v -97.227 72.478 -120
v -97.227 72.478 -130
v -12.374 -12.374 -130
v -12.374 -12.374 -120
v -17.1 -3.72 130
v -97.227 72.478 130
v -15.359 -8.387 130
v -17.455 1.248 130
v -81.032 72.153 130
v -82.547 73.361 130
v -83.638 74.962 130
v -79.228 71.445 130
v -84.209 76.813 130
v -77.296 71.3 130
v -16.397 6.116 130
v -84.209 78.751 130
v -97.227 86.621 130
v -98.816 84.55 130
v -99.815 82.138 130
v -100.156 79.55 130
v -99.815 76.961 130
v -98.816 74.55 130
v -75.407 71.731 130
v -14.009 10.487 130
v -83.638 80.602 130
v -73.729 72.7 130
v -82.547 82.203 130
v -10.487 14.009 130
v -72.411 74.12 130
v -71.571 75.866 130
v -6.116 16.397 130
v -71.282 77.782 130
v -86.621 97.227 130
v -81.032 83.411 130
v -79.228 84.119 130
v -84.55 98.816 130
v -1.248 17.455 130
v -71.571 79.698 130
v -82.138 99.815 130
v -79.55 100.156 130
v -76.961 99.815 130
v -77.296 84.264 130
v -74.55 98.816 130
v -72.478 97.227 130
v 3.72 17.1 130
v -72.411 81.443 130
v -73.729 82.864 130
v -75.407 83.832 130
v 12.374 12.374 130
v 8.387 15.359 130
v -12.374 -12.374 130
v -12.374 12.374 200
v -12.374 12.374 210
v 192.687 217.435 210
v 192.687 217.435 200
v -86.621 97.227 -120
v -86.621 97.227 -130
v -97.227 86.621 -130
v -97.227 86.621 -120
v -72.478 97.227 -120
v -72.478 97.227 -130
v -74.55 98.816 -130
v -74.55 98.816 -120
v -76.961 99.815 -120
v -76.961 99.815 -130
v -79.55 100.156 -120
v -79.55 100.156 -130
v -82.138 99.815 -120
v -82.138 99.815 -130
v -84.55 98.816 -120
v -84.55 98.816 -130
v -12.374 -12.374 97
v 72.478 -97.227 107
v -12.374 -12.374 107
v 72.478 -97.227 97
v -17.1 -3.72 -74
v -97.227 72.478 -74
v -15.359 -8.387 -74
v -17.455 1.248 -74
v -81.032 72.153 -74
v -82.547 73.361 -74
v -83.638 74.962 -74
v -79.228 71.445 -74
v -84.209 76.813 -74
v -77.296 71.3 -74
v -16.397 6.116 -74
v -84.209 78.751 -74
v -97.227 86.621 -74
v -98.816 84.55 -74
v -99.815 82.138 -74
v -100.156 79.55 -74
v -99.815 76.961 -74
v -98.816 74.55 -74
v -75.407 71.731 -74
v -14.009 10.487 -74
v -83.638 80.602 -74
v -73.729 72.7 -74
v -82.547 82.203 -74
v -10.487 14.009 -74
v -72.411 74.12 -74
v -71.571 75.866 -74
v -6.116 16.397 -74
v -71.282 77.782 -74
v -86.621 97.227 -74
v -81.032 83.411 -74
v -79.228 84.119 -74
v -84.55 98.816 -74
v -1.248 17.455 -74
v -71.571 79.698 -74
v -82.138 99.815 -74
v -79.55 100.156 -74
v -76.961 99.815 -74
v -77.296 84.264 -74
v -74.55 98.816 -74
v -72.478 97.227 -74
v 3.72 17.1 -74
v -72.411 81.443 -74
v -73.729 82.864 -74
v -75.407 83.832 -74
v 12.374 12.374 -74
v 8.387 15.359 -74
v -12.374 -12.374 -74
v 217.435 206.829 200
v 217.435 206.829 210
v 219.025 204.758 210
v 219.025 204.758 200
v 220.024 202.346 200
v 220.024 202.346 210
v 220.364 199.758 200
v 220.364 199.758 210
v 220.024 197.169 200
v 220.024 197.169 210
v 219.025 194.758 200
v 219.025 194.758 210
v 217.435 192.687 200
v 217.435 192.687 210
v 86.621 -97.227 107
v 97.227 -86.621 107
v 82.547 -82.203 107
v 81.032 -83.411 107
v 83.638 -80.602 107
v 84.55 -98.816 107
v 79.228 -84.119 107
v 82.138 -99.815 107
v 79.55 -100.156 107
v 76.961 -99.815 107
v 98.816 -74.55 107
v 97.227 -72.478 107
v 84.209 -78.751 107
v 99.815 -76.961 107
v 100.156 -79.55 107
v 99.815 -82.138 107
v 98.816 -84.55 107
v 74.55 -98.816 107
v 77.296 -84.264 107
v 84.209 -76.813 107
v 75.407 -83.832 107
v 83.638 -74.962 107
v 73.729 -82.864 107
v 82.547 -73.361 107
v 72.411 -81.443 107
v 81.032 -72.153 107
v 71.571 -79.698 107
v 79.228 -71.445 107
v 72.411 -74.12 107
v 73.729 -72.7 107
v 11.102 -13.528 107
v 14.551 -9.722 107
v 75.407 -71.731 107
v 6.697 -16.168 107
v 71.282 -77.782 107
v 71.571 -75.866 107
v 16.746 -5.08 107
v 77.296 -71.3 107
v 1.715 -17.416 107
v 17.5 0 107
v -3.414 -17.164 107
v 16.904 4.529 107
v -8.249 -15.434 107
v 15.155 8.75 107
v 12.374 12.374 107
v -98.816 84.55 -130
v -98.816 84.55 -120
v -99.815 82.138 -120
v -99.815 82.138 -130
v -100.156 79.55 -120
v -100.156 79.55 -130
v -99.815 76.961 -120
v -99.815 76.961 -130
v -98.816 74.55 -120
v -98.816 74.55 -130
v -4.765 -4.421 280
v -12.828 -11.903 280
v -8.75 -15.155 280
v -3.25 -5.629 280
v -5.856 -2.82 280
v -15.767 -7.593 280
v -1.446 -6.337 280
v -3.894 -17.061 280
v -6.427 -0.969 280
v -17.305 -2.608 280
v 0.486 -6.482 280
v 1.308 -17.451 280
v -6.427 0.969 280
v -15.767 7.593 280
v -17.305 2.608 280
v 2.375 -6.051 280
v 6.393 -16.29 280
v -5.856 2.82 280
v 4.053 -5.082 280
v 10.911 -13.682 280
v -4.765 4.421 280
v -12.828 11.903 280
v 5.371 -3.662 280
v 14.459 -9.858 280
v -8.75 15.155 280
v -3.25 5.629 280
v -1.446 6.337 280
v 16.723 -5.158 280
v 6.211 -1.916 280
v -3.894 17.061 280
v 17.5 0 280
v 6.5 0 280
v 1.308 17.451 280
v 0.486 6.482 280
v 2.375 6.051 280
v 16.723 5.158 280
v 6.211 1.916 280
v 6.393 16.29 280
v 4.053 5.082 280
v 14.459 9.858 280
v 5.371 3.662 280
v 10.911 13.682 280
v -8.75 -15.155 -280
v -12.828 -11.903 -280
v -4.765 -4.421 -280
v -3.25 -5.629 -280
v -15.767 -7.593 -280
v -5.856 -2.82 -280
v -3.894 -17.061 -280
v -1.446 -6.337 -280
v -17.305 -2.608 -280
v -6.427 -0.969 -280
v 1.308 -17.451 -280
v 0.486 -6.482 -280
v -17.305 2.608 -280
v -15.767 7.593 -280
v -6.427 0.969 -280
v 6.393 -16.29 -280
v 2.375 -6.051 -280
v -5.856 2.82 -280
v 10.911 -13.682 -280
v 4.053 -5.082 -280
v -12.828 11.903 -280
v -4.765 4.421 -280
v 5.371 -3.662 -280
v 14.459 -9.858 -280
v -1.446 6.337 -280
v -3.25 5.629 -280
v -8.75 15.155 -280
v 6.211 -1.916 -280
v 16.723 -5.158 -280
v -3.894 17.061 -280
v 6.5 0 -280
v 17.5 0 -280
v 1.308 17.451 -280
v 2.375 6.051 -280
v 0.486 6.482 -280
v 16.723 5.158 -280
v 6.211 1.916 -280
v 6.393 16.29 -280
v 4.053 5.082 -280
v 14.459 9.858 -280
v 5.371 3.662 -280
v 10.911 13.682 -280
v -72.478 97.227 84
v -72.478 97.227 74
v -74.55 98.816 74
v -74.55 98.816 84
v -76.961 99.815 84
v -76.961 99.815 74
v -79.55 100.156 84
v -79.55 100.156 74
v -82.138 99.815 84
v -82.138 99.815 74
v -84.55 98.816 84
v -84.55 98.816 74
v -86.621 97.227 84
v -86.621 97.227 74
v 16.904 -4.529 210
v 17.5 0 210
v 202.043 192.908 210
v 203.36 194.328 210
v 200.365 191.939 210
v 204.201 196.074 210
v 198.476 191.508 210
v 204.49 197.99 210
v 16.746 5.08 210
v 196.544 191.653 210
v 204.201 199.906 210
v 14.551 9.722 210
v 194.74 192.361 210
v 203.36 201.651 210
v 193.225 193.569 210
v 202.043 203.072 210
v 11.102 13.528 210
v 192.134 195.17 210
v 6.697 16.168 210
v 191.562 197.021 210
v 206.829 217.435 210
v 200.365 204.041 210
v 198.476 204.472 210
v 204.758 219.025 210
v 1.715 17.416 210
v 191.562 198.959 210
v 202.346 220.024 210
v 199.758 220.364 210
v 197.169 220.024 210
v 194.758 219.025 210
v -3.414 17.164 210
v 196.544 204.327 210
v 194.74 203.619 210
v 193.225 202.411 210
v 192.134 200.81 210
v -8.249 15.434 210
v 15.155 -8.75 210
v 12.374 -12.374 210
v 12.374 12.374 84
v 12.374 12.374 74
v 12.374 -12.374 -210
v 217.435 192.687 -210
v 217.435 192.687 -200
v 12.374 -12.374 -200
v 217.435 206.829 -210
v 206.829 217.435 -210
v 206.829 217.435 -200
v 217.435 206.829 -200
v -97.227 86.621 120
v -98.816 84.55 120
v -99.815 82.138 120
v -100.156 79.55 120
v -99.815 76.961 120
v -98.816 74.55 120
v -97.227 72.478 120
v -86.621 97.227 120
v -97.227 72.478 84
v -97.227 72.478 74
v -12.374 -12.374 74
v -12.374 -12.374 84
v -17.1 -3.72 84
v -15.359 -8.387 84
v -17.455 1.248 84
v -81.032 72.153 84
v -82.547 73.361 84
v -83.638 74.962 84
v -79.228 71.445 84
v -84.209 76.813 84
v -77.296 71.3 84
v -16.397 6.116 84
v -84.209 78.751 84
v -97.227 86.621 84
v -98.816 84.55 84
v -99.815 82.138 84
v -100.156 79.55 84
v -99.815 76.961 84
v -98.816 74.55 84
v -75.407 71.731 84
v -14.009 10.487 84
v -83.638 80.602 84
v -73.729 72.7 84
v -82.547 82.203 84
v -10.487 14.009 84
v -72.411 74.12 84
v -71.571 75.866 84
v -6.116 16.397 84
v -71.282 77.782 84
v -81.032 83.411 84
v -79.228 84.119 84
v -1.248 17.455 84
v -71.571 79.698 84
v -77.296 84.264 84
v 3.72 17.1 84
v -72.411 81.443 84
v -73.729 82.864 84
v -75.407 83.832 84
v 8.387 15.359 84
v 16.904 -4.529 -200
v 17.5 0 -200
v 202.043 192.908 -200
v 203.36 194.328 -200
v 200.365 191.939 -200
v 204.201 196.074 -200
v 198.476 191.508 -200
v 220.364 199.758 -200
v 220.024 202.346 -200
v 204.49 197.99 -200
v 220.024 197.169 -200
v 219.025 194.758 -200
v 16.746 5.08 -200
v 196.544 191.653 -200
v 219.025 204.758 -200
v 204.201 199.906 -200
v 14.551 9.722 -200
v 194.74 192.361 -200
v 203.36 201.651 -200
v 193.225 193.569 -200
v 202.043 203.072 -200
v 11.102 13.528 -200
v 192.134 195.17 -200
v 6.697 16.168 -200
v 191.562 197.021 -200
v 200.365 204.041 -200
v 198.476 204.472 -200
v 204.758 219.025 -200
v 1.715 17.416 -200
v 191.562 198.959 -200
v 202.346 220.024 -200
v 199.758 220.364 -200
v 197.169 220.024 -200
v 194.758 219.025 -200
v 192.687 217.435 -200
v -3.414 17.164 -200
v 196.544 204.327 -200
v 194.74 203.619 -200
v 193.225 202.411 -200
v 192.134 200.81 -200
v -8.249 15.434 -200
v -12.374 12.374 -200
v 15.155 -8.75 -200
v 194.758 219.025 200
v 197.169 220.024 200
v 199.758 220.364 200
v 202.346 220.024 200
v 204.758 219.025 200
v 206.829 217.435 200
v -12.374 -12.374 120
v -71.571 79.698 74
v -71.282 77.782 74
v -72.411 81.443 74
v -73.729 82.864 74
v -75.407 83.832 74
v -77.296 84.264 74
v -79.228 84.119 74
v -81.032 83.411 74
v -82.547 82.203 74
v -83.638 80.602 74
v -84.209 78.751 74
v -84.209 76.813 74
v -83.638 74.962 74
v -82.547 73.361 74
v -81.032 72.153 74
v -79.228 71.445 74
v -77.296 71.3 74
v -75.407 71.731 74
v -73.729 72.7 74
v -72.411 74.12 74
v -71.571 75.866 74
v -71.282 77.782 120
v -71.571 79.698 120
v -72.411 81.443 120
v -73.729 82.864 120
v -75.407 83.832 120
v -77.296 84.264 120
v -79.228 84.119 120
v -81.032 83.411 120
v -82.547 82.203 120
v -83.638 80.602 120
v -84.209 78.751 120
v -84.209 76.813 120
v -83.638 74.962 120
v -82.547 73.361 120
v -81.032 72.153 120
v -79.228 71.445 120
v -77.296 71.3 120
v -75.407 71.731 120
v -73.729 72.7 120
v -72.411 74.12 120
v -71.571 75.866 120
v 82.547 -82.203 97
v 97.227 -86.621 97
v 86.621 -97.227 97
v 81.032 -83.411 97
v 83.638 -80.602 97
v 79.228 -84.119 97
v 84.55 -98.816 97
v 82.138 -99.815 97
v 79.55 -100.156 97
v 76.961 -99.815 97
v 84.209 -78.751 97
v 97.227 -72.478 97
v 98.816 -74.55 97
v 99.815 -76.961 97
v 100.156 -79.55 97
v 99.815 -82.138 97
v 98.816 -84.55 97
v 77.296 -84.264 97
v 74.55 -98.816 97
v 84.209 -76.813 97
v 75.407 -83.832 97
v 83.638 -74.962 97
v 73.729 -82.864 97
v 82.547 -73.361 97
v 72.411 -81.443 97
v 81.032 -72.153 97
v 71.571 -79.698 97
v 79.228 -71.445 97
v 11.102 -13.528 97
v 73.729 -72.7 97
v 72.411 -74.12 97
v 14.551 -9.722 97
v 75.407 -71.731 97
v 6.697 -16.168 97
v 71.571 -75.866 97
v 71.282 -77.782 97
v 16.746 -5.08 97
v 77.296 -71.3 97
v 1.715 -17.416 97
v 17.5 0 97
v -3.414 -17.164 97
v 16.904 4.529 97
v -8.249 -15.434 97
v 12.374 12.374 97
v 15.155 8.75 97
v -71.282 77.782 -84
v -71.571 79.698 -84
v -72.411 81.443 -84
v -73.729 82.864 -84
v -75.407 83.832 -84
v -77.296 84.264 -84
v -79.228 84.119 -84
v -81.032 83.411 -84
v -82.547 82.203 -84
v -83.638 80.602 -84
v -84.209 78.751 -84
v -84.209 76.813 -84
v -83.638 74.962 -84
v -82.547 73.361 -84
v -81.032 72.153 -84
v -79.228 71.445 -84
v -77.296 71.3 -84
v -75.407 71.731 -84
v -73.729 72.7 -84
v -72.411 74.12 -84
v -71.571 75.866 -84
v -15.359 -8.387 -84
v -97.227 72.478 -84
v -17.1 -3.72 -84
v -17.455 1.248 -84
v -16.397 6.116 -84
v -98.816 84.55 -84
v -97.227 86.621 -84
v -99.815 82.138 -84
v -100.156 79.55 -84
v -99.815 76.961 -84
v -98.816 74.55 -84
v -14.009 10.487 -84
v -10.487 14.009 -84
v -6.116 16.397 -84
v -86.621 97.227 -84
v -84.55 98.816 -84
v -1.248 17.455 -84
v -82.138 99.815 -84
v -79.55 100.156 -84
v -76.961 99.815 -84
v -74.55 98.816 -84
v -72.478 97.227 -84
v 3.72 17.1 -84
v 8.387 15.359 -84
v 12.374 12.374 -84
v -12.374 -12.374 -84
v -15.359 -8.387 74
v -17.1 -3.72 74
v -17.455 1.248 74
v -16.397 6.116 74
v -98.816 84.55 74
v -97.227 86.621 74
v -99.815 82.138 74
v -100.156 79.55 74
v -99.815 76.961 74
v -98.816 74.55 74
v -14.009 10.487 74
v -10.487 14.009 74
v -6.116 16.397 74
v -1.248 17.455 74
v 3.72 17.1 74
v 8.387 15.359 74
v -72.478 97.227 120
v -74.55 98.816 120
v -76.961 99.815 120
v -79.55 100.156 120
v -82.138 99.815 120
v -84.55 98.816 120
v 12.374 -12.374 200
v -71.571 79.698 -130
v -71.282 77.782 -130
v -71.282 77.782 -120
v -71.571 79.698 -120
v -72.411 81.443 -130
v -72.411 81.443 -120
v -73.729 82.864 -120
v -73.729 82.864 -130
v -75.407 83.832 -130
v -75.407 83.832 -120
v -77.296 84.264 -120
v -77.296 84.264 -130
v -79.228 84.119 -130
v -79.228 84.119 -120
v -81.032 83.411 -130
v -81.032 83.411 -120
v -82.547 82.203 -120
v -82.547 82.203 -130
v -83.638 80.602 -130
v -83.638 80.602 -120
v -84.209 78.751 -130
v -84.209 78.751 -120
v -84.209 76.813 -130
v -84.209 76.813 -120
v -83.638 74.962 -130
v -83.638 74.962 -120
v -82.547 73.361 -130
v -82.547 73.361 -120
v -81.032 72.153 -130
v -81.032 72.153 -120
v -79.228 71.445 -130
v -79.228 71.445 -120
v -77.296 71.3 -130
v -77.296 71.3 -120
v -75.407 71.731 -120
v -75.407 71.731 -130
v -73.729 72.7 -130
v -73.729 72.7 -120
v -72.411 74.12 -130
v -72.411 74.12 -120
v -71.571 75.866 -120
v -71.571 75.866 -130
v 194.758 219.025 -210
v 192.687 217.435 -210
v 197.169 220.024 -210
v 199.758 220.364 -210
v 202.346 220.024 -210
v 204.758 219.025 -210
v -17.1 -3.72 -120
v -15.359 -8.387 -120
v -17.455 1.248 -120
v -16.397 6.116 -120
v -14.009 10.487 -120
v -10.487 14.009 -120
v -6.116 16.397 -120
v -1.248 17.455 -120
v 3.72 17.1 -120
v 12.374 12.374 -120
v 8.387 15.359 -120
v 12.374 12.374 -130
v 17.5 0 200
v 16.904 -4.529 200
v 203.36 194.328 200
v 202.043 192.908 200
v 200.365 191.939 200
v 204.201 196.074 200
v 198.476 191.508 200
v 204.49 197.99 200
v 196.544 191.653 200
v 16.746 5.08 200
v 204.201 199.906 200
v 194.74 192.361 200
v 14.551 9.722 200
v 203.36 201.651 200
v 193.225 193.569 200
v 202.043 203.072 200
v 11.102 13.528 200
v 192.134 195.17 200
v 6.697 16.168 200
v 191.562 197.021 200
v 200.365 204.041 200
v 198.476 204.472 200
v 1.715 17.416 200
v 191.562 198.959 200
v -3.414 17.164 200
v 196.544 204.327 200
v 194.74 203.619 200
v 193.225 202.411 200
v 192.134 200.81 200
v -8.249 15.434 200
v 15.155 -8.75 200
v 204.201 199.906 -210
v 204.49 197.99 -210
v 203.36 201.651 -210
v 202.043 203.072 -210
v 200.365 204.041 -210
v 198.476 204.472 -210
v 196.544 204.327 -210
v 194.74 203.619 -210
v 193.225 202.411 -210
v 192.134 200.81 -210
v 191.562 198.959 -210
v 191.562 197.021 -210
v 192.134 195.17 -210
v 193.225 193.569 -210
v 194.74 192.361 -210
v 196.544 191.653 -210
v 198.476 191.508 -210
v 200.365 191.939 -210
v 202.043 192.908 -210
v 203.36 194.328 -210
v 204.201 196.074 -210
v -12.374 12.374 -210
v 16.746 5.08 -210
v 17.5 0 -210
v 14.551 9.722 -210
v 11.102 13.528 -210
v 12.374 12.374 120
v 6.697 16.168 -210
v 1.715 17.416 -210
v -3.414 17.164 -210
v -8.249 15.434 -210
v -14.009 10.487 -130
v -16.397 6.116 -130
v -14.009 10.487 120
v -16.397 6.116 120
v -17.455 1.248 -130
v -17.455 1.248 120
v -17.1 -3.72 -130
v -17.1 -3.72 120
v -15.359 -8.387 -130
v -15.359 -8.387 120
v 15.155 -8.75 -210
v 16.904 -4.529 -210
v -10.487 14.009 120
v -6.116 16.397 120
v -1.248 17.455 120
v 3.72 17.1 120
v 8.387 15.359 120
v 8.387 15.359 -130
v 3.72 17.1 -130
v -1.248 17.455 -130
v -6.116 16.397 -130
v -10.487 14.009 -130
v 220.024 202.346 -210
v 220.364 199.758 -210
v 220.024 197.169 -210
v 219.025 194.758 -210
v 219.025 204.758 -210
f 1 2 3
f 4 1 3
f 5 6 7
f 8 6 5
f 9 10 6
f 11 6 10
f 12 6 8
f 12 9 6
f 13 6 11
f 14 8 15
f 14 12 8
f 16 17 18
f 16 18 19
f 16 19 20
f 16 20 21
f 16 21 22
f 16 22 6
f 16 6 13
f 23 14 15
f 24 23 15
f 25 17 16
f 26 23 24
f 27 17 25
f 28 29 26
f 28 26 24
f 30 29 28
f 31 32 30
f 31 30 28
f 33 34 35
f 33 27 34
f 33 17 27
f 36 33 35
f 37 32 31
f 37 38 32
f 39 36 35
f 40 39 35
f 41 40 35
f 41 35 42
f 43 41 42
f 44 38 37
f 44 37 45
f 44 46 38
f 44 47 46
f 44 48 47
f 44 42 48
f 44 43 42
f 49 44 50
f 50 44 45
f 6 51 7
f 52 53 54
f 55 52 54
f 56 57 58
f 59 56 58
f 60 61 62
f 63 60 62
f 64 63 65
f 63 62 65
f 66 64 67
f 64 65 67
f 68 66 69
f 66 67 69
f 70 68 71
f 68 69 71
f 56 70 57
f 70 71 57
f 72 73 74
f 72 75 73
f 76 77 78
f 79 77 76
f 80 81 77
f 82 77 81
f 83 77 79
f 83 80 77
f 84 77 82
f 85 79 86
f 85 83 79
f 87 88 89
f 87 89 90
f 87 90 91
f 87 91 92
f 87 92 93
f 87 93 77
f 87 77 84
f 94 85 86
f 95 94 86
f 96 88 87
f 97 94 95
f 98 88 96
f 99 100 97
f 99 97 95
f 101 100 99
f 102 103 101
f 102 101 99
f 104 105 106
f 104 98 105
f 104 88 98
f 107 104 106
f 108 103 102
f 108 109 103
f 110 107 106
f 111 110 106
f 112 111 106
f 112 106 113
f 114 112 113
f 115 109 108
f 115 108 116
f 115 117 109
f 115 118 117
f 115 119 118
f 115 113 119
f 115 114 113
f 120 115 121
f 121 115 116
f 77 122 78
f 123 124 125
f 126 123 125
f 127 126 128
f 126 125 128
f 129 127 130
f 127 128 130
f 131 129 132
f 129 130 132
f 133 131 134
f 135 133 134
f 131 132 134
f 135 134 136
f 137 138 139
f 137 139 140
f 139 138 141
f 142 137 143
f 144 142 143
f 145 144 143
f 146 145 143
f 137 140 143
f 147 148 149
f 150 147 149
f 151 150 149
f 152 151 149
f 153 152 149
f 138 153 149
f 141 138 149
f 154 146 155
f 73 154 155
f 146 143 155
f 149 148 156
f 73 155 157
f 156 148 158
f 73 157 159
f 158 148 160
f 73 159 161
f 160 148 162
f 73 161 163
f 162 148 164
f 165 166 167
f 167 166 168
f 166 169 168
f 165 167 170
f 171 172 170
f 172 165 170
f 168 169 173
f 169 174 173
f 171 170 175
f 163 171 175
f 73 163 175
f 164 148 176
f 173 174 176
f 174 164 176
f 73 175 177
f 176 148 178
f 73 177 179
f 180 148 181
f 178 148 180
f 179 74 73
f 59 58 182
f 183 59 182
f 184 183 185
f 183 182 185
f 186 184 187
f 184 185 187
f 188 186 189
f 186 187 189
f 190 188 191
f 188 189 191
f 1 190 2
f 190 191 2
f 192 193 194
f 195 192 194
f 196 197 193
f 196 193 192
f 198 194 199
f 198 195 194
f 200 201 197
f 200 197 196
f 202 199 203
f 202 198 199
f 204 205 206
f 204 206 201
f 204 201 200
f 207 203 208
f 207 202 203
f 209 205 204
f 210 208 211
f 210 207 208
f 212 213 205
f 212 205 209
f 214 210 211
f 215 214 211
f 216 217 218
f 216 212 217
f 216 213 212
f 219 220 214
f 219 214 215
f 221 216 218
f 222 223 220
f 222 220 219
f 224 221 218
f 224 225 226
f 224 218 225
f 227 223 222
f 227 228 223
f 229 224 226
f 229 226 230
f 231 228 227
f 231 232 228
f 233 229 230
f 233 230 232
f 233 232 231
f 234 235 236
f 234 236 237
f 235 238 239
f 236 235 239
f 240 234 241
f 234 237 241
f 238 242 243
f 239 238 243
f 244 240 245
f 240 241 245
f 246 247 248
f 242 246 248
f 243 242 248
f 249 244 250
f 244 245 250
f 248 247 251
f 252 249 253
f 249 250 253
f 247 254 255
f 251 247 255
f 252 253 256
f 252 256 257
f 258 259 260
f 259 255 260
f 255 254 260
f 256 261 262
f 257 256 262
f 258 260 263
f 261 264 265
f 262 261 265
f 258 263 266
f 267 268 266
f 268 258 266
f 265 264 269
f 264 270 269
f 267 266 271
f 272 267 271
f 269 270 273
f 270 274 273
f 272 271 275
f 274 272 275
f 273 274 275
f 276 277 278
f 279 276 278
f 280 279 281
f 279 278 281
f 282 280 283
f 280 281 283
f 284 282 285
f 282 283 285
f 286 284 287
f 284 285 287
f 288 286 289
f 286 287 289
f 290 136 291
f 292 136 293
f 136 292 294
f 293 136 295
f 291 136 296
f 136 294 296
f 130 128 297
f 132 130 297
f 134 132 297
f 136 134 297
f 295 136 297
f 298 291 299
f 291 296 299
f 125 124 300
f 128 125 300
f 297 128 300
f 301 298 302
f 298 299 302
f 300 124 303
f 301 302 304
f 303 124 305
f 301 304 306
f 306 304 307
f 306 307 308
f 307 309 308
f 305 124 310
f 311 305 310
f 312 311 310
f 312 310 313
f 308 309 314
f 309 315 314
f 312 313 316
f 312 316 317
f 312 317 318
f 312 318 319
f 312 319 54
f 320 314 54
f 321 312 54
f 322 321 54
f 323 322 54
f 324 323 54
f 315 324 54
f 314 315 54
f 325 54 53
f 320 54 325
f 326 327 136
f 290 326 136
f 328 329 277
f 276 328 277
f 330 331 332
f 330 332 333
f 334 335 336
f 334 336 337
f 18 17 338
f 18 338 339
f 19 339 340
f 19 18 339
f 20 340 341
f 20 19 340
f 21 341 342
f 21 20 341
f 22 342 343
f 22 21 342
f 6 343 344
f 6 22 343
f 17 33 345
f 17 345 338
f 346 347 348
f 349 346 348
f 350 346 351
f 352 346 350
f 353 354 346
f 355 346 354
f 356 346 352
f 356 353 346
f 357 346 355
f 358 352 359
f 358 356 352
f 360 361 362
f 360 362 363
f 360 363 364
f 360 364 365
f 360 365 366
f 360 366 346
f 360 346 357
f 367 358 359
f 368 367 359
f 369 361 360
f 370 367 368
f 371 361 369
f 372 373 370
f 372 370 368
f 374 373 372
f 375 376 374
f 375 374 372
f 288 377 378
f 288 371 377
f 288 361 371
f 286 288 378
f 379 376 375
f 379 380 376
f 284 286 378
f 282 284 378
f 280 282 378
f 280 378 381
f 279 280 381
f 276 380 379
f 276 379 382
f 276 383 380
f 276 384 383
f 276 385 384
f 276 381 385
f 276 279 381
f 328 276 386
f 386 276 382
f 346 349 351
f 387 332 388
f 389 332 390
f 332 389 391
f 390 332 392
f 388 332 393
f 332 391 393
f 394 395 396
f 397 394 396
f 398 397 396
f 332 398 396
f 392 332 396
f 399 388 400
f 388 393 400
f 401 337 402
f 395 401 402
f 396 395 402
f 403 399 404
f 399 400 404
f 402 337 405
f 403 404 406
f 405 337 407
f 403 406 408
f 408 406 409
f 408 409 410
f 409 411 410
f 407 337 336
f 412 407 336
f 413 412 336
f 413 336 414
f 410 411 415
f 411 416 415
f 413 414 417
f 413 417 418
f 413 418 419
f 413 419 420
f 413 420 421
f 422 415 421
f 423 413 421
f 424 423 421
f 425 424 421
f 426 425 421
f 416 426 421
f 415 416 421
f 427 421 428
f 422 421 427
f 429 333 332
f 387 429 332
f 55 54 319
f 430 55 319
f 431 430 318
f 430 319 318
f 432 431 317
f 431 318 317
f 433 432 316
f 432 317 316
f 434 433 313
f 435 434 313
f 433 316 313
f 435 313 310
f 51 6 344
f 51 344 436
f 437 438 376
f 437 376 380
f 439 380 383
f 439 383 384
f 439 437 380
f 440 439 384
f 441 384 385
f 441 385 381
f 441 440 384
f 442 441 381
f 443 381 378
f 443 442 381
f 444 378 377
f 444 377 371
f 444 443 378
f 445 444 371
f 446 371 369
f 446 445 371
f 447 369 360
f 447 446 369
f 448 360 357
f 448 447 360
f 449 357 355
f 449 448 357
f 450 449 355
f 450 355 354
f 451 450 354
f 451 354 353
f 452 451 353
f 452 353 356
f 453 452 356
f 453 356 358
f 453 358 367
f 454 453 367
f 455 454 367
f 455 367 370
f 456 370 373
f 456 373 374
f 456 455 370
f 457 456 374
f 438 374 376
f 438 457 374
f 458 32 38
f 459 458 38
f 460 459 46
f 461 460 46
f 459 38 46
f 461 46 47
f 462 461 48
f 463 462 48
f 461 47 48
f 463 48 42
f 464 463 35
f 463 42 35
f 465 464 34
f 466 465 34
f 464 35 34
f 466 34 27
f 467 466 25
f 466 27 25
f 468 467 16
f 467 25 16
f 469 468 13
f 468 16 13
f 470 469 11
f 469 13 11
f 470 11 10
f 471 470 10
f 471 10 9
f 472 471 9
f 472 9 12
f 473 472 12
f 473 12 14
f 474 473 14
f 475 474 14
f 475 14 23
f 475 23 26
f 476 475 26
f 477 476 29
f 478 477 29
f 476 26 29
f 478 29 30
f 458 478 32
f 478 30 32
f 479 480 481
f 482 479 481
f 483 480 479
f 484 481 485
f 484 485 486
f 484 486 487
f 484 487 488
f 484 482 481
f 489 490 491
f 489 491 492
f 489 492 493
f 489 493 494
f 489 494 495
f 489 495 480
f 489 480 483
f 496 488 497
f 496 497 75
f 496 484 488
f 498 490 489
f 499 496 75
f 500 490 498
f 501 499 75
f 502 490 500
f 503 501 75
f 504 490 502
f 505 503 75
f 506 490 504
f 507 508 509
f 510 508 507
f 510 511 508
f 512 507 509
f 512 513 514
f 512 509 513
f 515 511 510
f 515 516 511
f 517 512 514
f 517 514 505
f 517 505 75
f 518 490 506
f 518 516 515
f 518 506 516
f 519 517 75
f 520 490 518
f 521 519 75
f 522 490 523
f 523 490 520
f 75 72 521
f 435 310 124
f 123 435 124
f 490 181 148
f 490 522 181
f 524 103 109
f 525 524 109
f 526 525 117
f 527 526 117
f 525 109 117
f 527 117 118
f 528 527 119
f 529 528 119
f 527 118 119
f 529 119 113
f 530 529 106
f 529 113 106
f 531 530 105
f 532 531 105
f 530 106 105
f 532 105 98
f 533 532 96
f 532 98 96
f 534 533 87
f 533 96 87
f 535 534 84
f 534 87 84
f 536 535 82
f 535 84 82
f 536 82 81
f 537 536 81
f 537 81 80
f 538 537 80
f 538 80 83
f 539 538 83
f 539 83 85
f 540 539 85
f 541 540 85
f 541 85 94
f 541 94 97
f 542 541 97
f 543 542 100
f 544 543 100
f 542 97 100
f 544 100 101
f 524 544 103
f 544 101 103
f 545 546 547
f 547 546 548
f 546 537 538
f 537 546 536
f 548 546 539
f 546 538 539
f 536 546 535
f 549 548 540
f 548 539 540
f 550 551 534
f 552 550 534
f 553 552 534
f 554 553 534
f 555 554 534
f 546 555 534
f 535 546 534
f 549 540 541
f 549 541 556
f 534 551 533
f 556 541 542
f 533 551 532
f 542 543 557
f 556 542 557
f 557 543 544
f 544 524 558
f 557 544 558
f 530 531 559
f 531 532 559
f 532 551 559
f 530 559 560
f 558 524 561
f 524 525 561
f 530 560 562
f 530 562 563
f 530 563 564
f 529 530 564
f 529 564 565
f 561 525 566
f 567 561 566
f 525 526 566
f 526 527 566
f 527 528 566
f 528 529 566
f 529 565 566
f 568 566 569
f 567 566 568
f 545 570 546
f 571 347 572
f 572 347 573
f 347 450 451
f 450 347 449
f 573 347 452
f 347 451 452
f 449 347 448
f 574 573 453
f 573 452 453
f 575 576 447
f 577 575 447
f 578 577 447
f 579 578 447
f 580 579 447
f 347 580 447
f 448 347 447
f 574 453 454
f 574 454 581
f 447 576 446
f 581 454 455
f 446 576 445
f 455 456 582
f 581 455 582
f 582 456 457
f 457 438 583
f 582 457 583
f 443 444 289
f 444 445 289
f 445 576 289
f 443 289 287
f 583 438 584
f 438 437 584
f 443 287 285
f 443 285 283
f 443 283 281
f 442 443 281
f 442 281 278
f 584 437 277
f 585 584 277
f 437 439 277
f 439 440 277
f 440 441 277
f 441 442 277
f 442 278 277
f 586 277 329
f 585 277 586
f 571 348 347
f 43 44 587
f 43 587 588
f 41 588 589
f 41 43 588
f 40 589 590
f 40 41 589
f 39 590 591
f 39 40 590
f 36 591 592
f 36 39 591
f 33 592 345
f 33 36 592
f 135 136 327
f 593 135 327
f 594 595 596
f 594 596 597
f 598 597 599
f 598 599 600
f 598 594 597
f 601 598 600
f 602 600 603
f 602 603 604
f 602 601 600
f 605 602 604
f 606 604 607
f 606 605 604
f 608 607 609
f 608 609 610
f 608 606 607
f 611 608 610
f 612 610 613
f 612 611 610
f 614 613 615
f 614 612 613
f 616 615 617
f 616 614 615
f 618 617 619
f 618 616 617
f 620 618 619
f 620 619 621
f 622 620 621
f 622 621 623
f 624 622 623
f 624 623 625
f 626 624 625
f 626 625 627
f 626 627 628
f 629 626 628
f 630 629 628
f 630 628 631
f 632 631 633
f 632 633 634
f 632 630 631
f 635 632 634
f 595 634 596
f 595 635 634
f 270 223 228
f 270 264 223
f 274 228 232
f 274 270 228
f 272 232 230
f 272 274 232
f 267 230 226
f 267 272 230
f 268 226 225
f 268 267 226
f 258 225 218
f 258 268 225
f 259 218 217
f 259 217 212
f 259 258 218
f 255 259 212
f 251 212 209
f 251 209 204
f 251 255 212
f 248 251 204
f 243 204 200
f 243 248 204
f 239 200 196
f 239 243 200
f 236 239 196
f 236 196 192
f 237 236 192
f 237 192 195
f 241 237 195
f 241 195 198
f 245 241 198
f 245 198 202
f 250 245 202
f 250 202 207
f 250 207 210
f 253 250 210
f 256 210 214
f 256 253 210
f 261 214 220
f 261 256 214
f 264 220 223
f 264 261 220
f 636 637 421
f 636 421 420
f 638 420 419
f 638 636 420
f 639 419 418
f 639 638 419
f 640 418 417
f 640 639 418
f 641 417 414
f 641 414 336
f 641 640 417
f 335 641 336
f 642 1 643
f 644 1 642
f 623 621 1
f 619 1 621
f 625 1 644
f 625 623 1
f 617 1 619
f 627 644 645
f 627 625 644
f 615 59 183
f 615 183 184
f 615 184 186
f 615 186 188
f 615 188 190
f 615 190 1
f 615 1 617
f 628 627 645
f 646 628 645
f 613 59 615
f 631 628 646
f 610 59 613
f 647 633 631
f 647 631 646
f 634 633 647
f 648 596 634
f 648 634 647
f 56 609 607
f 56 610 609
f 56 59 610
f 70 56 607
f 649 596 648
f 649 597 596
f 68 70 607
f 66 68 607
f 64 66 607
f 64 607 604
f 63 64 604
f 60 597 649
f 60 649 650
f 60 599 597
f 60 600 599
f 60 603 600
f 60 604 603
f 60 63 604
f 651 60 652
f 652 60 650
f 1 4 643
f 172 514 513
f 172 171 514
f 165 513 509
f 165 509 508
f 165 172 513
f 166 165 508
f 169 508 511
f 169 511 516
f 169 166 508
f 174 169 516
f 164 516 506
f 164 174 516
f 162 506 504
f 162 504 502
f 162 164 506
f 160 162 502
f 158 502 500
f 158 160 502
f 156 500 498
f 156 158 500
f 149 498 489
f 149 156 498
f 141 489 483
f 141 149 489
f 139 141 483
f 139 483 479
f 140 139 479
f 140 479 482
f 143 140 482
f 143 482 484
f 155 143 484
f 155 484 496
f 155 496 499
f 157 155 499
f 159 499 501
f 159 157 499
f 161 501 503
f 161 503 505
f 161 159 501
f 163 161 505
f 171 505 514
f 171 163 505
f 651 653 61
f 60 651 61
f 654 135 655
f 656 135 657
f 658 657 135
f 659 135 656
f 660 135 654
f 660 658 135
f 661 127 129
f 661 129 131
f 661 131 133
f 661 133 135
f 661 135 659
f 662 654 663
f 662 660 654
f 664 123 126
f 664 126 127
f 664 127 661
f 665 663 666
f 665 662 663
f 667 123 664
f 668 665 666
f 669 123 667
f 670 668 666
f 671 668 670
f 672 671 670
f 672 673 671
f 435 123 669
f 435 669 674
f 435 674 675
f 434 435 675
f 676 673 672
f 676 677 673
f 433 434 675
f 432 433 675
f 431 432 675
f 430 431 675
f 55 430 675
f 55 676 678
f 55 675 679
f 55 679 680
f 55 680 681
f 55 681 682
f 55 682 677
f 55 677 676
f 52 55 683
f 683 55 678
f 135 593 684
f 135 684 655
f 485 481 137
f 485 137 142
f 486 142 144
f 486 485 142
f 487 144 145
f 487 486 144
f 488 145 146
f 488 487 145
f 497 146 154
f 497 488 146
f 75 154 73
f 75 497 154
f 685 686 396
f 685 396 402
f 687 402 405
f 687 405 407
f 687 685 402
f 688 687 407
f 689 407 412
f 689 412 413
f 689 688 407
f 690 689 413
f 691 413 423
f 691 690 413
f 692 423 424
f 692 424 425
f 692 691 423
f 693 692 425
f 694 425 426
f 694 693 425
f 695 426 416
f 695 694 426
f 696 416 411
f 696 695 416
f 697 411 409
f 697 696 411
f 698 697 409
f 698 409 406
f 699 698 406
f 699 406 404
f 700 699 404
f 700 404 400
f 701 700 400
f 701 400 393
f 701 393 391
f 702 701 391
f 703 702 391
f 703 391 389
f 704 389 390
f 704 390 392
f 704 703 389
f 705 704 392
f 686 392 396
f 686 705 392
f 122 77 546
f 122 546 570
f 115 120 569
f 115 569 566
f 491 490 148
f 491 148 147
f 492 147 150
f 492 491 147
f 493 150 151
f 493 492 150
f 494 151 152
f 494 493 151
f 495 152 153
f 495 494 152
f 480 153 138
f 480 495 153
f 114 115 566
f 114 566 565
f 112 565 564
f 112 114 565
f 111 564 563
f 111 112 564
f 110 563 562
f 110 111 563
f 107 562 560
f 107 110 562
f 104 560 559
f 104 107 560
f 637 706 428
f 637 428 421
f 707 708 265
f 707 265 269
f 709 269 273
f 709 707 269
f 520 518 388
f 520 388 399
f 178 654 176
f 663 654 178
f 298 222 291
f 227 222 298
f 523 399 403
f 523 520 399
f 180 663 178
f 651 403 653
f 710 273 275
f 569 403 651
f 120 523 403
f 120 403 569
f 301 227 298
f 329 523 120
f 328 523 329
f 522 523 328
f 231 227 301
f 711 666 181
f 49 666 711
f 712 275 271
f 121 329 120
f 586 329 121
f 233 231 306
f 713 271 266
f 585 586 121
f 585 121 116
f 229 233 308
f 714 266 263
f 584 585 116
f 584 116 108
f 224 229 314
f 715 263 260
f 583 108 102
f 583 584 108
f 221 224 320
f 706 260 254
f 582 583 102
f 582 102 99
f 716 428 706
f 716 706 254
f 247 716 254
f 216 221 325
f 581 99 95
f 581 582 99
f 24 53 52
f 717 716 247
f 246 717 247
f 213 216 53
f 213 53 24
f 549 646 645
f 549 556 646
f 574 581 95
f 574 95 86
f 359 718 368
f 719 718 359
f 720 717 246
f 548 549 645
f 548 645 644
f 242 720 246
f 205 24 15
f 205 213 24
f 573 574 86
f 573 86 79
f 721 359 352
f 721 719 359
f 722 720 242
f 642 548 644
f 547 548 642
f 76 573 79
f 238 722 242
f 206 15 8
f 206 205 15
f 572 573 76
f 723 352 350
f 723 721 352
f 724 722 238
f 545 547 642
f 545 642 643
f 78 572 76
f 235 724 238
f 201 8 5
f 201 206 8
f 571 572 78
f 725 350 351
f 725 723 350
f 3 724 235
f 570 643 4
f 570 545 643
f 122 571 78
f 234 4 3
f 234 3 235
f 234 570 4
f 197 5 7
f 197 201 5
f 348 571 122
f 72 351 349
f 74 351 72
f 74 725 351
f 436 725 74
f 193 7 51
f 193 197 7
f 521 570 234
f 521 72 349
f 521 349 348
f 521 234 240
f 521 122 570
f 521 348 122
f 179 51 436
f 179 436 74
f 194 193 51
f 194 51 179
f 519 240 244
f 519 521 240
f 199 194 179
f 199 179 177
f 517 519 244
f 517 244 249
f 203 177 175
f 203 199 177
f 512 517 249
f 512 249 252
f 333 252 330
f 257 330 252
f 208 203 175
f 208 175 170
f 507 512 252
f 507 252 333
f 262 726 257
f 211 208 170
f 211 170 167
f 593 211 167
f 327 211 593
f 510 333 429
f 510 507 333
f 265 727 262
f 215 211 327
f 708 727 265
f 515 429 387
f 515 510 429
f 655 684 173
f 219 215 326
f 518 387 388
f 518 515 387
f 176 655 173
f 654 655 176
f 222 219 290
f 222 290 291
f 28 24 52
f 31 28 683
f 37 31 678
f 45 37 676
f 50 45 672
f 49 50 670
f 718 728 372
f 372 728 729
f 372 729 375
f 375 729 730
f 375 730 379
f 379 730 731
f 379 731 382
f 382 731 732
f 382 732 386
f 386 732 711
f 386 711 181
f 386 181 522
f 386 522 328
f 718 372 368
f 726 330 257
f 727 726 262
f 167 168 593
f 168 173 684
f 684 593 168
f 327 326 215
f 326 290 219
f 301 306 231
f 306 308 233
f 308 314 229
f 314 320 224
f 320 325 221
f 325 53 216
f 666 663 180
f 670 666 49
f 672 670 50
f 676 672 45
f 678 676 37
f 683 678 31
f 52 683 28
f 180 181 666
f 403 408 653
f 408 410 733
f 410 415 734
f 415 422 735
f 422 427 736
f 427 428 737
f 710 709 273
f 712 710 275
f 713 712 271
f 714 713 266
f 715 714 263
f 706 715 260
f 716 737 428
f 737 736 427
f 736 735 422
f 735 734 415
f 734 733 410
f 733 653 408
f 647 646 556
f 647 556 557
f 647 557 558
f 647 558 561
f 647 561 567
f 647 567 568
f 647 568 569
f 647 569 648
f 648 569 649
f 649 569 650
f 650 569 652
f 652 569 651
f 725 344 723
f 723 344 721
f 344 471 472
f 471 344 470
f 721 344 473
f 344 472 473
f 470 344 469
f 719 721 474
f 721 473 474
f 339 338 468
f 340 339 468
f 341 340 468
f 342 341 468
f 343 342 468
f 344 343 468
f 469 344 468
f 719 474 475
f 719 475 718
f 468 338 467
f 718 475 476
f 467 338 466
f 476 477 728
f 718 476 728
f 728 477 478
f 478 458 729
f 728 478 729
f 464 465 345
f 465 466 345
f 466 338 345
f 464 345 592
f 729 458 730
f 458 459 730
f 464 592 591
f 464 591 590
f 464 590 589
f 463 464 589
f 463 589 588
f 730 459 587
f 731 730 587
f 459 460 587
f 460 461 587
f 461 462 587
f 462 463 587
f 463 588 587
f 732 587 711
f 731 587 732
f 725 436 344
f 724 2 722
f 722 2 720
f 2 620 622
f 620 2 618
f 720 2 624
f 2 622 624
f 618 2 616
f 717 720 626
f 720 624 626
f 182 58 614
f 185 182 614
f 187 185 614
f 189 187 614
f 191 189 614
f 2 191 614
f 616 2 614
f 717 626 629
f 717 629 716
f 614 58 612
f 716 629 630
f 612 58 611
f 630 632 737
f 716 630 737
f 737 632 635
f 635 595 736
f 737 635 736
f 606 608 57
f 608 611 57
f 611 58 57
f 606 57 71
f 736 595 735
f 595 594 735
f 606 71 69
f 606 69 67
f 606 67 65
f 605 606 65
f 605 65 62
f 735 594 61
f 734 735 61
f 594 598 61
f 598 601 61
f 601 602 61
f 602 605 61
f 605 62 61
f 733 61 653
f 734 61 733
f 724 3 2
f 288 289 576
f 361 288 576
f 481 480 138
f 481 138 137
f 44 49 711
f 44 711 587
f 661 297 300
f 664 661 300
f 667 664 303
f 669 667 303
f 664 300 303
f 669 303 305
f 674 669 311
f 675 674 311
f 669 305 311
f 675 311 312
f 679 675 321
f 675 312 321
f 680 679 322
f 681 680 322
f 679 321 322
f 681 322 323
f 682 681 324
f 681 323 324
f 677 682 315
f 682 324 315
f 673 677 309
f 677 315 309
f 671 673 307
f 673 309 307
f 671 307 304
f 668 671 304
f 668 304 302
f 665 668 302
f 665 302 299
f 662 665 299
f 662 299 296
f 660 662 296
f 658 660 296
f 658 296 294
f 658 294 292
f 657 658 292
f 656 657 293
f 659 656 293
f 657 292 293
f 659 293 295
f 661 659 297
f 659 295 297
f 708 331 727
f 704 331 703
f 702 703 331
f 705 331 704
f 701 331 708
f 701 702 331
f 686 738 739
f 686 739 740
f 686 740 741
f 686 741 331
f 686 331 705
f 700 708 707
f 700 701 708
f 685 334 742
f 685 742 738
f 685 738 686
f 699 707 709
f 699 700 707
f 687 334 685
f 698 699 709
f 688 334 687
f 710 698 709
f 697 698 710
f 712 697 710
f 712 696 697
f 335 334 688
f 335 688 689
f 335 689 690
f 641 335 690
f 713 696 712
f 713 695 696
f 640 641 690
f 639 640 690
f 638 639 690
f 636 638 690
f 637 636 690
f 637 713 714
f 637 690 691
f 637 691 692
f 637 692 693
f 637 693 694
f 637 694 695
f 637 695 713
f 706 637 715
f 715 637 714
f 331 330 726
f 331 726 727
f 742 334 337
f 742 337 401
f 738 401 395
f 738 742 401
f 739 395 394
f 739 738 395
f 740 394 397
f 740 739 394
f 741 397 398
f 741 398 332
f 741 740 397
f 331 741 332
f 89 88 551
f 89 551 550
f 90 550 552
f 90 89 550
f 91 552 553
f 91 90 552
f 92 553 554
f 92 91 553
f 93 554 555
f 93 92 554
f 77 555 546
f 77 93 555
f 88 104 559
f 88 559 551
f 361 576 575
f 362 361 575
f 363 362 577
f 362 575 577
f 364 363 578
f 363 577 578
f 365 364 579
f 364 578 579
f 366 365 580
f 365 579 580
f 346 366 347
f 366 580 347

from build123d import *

# Parameters (mm, degrees)
SKETCH1_R               = 17.5
SKETCH1_R_2             = 6.5
BOSS_EXTRUDE1_DEPTH     = 280
SKETCH2_R               = 6.5
BOSS_EXTRUDE2_DEPTH     = 10
SKETCH3_R               = 6.5
BOSS_EXTRUDE3_DEPTH     = 10
MIRROR3_COPY_1_SKETCH_R = 6.5
MIRROR3_COPY_1_DEPTH    = 10
SKETCH4_R               = 6.5
BOSS_EXTRUDE4_DEPTH     = 5


with BuildPart() as part:
    # Sketch1 → Boss-Extrude1 (new, symmetric)
    with BuildSketch(Plane.XY):
        Circle(SKETCH1_R)
        Circle(SKETCH1_R_2, mode=Mode.SUBTRACT)
    extrude(amount=BOSS_EXTRUDE1_DEPTH, both=True)

    # Sketch2 → Boss-Extrude2 (add)
    with BuildSketch(Plane.XY.offset(210)):
        with BuildLine():
            Line((-12.374368671, 12.374368671), (192.686597873, 217.435335215))
            ThreePointArc((192.686597873, 217.435335215), (199.757665685, 220.364267403), (206.828733497, 217.435335215))
            Line((206.828733497, 217.435335215), (217.435335215, 206.828733497))
            ThreePointArc((217.435335215, 206.828733497), (220.364267403, 199.757665685), (217.435335215, 192.686597873))
            Line((217.435335215, 192.686597873), (12.374368671, -12.374368671))
            ThreePointArc((12.374368671, -12.374368671), (12.374368671, 12.374368671), (-12.374368671, 12.374368671))
        make_face()
        with Locations((197.989898732, 197.989898732)):
            Circle(SKETCH2_R, mode=Mode.SUBTRACT)
    boss_extrude2 = extrude(amount=-BOSS_EXTRUDE2_DEPTH)

    # Mirror1: Boss-Extrude2 across plane
    add(boss_extrude2.mirror(Plane.XY))

    # Sketch3 → Boss-Extrude3 (add)
    with BuildSketch(Plane.XY.offset(130)):
        with BuildLine():
            Line((12.374368671, 12.374368671), (-72.478445072, 97.227182413))
            ThreePointArc((-72.478445072, 97.227182413), (-79.549512883, 100.156114601), (-86.620580695, 97.227182413))
            Line((-86.620580695, 97.227182413), (-97.227182413, 86.620580695))
            ThreePointArc((-97.227182413, 86.620580695), (-100.156114601, 79.549512883), (-97.227182413, 72.478445072))
            Line((-97.227182413, 72.478445072), (-12.374368671, -12.374368671))
            ThreePointArc((-12.374368671, -12.374368671), (-12.374368671, 12.374368671), (12.374368671, 12.374368671))
        make_face()
        with Locations((-77.781745931, 77.781745931)):
            Circle(SKETCH3_R, mode=Mode.SUBTRACT)
    boss_extrude3 = extrude(amount=-BOSS_EXTRUDE3_DEPTH)

    # Mirror2: Boss-Extrude3 across plane
    add(boss_extrude3.mirror(Plane(origin=(0, 0, 102), x_dir=(1, 0, 0), z_dir=(0, 0, -1))))

    # Mirror3: Boss-Extrude3 across plane
    add(boss_extrude3.mirror(Plane.XY))

    # Mirror3 copy 1 sketch → Mirror3 copy 1 (add)
    with BuildSketch(Plane.XY.offset(-74)):
        with BuildLine():
            Line((12.374368671, 12.374368671), (-72.478445072, 97.227182413))
            ThreePointArc((-72.478445072, 97.227182413), (-79.549512883, 100.156114601), (-86.620580695, 97.227182413))
            Line((-86.620580695, 97.227182413), (-97.227182413, 86.620580695))
            ThreePointArc((-97.227182413, 86.620580695), (-100.156114601, 79.549512883), (-97.227182413, 72.478445072))
            Line((-97.227182413, 72.478445072), (-12.374368671, -12.374368671))
            ThreePointArc((-12.374368671, -12.374368671), (-12.374368671, 12.374368671), (12.374368671, 12.374368671))
        make_face()
        with Locations((-77.781745931, 77.781745931)):
            Circle(MIRROR3_COPY_1_SKETCH_R, mode=Mode.SUBTRACT)
    extrude(amount=-MIRROR3_COPY_1_DEPTH)

    # Sketch4 → Boss-Extrude4 (add, symmetric)
    with BuildSketch(Plane(origin=(0, 0, 102), x_dir=(-1, 0, 0), z_dir=(0, 0, -1))):
        with BuildLine():
            Line((-12.374368671, 12.374368671), (-97.227182413, -72.478445072))
            ThreePointArc((-97.227182413, -72.478445072), (-100.156114601, -79.549512883), (-97.227182413, -86.620580695))
            Line((-97.227182413, -86.620580695), (-86.620580695, -97.227182413))
            ThreePointArc((-86.620580695, -97.227182413), (-79.549512883, -100.156114601), (-72.478445072, -97.227182413))
            Line((-72.478445072, -97.227182413), (12.374368671, -12.374368671))
            ThreePointArc((12.374368671, -12.374368671), (-12.374368671, -12.374368671), (-12.374368671, 12.374368671))
        make_face()
        with Locations((-77.781745931, -77.781745931)):
            Circle(SKETCH4_R, mode=Mode.SUBTRACT)
    extrude(amount=BOSS_EXTRUDE4_DEPTH, both=True)


solid = part.part
